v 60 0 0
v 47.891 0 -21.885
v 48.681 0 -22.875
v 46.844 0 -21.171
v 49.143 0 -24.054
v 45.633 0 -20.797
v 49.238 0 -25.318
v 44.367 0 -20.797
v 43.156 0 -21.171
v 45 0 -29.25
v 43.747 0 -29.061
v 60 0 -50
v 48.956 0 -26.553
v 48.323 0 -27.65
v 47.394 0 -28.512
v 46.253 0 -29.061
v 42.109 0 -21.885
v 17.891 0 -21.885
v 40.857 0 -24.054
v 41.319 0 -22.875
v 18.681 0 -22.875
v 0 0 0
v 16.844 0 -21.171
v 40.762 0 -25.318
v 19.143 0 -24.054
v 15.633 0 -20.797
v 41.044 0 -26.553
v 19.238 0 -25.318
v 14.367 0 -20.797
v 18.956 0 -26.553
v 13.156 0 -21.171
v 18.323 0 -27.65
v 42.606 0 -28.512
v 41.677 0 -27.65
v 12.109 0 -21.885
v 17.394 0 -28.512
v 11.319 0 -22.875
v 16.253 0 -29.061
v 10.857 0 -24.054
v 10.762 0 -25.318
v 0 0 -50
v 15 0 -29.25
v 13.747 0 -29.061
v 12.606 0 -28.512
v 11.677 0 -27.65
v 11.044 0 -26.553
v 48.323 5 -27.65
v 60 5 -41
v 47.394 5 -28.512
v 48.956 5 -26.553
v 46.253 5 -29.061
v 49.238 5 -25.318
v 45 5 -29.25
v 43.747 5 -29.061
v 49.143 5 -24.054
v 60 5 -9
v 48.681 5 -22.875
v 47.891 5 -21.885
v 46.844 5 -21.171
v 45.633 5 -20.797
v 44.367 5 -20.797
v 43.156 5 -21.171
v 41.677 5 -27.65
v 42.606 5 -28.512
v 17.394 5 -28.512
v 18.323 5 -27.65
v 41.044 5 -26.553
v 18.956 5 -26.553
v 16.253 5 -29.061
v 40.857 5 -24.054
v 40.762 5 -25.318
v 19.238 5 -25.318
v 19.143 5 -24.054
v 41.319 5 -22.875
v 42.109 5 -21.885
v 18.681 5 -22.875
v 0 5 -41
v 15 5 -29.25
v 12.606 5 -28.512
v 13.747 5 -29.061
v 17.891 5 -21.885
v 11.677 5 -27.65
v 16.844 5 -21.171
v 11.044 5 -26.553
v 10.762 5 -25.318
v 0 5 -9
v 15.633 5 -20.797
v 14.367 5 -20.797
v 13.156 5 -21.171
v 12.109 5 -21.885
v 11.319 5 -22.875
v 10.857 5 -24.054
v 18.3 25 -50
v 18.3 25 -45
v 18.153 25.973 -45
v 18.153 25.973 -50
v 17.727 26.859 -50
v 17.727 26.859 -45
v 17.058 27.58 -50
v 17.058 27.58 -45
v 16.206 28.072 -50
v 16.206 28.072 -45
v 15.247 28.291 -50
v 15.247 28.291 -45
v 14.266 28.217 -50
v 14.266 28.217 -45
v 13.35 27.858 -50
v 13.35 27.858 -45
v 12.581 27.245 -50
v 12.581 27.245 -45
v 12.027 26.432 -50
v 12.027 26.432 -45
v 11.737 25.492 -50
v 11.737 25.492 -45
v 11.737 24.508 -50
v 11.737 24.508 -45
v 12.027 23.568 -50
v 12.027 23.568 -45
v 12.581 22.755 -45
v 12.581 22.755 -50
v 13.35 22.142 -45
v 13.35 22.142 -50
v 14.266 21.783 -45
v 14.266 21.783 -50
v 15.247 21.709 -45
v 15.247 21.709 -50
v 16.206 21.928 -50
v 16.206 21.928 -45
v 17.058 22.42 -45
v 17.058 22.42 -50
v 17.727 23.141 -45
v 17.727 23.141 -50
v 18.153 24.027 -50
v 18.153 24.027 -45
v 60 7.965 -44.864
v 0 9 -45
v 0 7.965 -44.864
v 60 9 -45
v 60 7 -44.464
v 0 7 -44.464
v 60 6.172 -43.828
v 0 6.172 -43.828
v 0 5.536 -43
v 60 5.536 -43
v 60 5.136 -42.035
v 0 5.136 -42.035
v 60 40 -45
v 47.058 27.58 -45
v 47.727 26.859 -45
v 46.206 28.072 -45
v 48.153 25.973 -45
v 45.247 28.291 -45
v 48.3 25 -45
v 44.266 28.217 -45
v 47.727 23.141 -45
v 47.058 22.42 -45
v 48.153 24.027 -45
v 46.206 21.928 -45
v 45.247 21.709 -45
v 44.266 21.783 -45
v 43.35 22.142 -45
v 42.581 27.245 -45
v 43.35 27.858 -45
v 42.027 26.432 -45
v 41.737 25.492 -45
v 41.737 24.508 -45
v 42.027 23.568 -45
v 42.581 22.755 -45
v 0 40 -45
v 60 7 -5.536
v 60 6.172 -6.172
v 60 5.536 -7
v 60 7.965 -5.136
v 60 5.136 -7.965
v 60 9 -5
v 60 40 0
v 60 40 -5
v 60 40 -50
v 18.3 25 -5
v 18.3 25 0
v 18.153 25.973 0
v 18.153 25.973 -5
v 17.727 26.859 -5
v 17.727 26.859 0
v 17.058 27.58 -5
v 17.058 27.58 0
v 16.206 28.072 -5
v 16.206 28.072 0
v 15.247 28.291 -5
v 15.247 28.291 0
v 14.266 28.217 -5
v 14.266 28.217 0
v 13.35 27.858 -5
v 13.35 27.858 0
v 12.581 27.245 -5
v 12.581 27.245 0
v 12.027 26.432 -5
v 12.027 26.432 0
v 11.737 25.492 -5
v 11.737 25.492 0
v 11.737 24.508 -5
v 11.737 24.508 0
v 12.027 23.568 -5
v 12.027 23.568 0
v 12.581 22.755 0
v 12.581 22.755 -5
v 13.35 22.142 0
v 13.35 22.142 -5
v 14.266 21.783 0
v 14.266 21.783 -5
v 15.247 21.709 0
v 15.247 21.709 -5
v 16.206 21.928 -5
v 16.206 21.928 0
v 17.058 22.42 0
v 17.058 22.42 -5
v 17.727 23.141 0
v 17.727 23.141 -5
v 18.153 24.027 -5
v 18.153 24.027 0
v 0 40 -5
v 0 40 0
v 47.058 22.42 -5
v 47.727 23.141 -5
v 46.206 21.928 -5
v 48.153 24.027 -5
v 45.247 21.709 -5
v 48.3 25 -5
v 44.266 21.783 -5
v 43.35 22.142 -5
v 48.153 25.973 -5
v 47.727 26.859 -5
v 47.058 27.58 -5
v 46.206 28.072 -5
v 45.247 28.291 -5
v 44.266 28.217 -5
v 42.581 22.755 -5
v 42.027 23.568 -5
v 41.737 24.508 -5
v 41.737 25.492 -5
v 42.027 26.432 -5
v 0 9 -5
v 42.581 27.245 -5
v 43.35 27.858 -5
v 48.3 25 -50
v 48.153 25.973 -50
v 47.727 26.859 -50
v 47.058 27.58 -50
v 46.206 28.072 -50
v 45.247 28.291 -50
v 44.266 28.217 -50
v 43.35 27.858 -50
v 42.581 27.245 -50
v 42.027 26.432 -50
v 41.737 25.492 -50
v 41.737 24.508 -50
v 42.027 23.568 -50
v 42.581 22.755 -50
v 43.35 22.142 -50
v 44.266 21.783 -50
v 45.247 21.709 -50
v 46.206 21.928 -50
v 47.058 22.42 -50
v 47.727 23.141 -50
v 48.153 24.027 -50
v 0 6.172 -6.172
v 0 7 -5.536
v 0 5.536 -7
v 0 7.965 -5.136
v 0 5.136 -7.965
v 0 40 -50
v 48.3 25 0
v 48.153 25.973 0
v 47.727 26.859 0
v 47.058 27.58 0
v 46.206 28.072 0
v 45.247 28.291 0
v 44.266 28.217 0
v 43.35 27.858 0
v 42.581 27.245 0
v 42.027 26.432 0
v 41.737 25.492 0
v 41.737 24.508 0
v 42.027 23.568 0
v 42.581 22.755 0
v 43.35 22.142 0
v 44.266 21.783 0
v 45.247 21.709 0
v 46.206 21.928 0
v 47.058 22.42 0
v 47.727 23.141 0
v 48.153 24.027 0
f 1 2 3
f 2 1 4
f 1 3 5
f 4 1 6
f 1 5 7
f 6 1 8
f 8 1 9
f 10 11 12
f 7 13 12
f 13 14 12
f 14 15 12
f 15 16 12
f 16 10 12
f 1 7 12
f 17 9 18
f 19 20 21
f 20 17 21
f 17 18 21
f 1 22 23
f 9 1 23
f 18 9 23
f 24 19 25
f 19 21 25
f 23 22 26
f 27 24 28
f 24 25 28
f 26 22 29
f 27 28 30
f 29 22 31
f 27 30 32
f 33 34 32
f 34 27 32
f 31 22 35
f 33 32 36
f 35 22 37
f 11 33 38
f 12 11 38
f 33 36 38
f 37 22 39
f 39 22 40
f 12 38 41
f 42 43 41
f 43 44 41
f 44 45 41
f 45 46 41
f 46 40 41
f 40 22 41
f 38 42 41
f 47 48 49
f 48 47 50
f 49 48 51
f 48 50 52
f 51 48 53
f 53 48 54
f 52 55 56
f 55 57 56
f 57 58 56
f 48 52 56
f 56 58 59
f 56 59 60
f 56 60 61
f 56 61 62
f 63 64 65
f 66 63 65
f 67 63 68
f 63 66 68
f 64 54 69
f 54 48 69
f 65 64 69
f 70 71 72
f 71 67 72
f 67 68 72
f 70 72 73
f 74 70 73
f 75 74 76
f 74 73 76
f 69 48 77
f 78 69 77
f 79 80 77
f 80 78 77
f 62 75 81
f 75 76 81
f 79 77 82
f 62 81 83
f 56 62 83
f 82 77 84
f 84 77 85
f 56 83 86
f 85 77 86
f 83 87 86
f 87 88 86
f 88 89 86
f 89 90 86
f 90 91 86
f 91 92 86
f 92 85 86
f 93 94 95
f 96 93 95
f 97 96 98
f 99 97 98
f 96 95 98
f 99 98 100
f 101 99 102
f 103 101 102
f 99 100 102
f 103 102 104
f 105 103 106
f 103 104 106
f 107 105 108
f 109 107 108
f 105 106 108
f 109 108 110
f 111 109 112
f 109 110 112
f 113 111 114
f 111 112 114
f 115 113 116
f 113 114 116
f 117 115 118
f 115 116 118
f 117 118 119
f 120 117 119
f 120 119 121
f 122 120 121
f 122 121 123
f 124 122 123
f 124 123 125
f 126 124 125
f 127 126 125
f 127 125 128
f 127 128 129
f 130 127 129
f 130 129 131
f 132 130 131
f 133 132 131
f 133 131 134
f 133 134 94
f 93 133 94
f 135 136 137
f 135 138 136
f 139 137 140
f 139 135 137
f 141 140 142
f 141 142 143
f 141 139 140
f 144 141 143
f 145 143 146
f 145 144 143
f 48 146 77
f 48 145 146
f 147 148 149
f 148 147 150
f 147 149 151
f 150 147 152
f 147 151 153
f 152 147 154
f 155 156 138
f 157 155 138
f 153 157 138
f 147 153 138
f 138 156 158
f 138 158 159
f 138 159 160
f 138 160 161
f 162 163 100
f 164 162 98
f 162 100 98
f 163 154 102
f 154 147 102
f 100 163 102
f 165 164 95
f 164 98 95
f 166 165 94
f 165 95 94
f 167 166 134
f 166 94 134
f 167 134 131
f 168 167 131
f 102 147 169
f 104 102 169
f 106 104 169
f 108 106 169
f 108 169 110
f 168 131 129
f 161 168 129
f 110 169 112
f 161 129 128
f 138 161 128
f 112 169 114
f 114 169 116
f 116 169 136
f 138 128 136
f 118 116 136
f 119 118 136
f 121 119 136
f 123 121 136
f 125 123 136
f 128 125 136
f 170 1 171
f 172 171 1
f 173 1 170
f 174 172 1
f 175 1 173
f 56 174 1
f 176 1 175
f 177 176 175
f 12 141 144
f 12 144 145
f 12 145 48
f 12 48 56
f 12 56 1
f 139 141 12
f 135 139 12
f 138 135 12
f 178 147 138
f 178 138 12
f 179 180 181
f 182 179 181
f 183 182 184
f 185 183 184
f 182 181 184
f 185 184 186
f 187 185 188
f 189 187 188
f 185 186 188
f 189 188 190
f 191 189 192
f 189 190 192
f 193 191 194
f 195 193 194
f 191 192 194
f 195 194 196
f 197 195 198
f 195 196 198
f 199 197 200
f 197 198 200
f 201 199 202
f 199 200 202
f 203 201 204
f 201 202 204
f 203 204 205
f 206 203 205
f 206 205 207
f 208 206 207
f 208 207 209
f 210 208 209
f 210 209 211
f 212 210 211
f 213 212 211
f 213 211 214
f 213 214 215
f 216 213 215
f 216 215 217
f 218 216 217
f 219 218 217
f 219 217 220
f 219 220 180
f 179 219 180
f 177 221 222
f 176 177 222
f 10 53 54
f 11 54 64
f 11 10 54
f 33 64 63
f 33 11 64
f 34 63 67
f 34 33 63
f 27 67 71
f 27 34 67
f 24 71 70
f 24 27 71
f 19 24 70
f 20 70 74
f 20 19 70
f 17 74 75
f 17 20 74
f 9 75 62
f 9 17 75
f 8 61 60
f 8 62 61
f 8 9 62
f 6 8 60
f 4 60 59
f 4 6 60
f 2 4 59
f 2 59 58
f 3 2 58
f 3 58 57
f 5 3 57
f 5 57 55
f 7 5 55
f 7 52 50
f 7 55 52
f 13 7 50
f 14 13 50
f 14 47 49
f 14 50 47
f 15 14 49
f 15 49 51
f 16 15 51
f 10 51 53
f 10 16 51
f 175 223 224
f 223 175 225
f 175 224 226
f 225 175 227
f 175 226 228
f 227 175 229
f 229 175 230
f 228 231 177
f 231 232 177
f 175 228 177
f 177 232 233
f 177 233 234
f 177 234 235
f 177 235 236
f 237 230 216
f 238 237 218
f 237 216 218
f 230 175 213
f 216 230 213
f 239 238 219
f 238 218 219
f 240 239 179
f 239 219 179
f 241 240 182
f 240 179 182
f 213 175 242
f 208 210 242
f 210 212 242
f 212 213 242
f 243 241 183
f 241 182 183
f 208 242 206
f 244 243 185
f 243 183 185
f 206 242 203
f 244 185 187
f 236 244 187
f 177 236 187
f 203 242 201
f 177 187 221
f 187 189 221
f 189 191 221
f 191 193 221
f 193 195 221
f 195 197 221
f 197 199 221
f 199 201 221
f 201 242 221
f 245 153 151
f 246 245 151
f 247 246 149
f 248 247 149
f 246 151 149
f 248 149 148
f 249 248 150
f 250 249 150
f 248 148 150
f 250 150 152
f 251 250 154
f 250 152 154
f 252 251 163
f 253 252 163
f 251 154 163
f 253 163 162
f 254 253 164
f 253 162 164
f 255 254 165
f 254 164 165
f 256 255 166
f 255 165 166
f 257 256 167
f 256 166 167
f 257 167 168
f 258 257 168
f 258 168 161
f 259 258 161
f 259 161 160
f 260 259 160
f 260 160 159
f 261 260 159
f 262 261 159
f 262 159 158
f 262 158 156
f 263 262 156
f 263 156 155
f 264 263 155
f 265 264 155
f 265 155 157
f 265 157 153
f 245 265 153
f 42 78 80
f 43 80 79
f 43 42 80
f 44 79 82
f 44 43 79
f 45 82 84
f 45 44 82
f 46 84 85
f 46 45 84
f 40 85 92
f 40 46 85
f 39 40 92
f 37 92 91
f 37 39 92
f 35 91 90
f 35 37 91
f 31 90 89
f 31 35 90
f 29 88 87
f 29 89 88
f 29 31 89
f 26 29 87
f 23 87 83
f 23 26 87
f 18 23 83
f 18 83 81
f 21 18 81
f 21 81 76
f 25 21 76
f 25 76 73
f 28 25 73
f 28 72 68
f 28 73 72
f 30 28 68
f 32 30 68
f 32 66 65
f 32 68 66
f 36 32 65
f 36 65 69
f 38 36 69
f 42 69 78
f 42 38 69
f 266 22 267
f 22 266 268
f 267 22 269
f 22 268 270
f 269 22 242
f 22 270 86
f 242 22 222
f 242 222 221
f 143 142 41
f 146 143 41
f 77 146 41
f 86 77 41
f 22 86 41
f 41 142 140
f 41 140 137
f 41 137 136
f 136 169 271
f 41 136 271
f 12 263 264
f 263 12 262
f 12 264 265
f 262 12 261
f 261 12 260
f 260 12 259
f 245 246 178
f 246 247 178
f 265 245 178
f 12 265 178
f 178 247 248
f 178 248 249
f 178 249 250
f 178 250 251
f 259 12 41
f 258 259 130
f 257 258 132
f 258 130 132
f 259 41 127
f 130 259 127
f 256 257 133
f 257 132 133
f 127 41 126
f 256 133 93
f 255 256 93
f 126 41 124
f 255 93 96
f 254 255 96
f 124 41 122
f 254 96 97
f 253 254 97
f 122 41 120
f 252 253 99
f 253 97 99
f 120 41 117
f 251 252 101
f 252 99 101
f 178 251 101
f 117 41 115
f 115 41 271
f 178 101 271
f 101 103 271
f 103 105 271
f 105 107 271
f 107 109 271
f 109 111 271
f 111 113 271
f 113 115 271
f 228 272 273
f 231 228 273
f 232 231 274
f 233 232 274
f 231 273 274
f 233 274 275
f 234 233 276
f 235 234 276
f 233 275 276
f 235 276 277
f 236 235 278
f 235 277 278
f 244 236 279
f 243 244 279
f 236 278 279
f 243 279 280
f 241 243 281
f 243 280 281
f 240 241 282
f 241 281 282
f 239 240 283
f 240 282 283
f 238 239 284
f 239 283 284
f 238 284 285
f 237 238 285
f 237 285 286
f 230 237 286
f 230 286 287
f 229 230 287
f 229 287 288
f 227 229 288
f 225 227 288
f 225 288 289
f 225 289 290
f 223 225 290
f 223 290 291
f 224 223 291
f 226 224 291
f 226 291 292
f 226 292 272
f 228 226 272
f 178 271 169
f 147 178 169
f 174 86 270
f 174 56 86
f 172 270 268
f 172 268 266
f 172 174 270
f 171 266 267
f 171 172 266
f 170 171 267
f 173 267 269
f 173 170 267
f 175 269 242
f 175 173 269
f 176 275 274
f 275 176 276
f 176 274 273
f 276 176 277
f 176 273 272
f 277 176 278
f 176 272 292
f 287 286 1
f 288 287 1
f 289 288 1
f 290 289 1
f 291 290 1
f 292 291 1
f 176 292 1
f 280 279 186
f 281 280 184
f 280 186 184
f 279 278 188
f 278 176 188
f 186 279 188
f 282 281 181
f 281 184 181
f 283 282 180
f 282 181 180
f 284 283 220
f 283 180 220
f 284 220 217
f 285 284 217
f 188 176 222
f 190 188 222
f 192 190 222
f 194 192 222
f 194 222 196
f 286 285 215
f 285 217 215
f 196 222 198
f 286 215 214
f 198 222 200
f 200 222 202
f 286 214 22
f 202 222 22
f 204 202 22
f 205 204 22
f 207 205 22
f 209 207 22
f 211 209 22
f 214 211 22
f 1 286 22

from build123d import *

# Parameters (mm, degrees)
EXTRUDE_1_DEPTH     = 60
SKETCH_2_R          = 4.25
CUT_EXTRUDE_1_DEPTH = 88.749643874
SKETCH_3_R          = 3.3
CUT_EXTRUDE_2_DEPTH = 88.749643874
FILLET_1_R          = 4


with BuildPart() as part:
    # 草圖1 → 填料-伸長1 (new body)
    with BuildSketch(Plane(origin=(0, 0, 0), x_dir=(0, 0, -1), z_dir=(1, 0, 0))):
        Polygon((0, 0), (50, 0), (50, 40), (45, 40), (45, 5), (5, 5), (5, 40), (0, 40), align=None)
    extrude(amount=EXTRUDE_1_DEPTH)

    # 草圖2 → 除料-伸長1 (cut, through all)
    with BuildSketch(Plane(origin=(0, 0, 0), x_dir=(1, 0, 0), z_dir=(0, 1, 0))):
        with Locations(Location((15, 25, 0), (0, 0, 90))):
            Circle(SKETCH_2_R)
        with Locations(Location((45, 25, 0), (0, 0, 90))):
            Circle(SKETCH_2_R)
    extrude(amount=CUT_EXTRUDE_1_DEPTH, mode=Mode.SUBTRACT)

    # 草圖3 → 除料-伸長2 (cut, through all)
    with BuildSketch(Plane.XY):
        with Locations((15, 25)):
            Circle(SKETCH_3_R)
        with Locations((45, 25)):
            Circle(SKETCH_3_R)
    extrude(amount=-CUT_EXTRUDE_2_DEPTH, mode=Mode.SUBTRACT)

    # 圓角1
    fillet_1_edges = [part.edges().sort_by_distance(p)[0] for p in [
        (30, 5, -5),
        (30, 5, -45),
    ]]
    fillet(fillet_1_edges, radius=FILLET_1_R)


solid = part.part
